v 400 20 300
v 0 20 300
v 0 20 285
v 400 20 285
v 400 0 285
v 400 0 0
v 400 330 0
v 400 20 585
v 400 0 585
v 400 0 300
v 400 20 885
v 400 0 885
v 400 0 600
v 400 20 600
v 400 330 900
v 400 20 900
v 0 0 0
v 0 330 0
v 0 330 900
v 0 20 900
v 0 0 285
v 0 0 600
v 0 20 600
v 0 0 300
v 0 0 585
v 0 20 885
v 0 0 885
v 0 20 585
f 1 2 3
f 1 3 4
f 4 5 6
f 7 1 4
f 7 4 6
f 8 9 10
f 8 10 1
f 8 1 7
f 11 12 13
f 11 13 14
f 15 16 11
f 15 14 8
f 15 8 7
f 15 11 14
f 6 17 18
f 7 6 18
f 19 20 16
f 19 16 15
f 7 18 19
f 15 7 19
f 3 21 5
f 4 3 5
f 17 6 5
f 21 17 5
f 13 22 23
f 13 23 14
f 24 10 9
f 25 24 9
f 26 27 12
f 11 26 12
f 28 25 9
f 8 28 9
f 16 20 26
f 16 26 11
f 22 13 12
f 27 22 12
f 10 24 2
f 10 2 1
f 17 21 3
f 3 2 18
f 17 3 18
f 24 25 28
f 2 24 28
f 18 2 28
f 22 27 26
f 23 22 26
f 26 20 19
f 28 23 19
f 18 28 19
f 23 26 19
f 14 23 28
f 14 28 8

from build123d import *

# Parameters (mm, degrees)
F0_W     = 330
F0_H     = 900
F1_DEPTH = 400
F2_W     = 400
F2_H     = 15
F3_DEPTH = 20


# Not quite as in the source:
# - a feature names something its author has since deleted; it is built from what else it names


with BuildPart() as f1:
    # F0 (on Right) → F1 (new body)
    with BuildSketch(Plane.YZ):
        with Locations((165, 450)):
            Rectangle(F0_W, F0_H)
    extrude(amount=F1_DEPTH)

    # F2 (on face) → F3 (cut)
    with BuildSketch(Plane.XZ):
        with Locations((200, 892.5)):
            Rectangle(F2_W, F2_H)
        with Locations((200, 592.5)):
            Rectangle(F2_W, F2_H)
        with Locations((200, 292.5)):
            Rectangle(F2_W, F2_H)
    extrude(amount=-F3_DEPTH, mode=Mode.SUBTRACT)


solid = f1.part
